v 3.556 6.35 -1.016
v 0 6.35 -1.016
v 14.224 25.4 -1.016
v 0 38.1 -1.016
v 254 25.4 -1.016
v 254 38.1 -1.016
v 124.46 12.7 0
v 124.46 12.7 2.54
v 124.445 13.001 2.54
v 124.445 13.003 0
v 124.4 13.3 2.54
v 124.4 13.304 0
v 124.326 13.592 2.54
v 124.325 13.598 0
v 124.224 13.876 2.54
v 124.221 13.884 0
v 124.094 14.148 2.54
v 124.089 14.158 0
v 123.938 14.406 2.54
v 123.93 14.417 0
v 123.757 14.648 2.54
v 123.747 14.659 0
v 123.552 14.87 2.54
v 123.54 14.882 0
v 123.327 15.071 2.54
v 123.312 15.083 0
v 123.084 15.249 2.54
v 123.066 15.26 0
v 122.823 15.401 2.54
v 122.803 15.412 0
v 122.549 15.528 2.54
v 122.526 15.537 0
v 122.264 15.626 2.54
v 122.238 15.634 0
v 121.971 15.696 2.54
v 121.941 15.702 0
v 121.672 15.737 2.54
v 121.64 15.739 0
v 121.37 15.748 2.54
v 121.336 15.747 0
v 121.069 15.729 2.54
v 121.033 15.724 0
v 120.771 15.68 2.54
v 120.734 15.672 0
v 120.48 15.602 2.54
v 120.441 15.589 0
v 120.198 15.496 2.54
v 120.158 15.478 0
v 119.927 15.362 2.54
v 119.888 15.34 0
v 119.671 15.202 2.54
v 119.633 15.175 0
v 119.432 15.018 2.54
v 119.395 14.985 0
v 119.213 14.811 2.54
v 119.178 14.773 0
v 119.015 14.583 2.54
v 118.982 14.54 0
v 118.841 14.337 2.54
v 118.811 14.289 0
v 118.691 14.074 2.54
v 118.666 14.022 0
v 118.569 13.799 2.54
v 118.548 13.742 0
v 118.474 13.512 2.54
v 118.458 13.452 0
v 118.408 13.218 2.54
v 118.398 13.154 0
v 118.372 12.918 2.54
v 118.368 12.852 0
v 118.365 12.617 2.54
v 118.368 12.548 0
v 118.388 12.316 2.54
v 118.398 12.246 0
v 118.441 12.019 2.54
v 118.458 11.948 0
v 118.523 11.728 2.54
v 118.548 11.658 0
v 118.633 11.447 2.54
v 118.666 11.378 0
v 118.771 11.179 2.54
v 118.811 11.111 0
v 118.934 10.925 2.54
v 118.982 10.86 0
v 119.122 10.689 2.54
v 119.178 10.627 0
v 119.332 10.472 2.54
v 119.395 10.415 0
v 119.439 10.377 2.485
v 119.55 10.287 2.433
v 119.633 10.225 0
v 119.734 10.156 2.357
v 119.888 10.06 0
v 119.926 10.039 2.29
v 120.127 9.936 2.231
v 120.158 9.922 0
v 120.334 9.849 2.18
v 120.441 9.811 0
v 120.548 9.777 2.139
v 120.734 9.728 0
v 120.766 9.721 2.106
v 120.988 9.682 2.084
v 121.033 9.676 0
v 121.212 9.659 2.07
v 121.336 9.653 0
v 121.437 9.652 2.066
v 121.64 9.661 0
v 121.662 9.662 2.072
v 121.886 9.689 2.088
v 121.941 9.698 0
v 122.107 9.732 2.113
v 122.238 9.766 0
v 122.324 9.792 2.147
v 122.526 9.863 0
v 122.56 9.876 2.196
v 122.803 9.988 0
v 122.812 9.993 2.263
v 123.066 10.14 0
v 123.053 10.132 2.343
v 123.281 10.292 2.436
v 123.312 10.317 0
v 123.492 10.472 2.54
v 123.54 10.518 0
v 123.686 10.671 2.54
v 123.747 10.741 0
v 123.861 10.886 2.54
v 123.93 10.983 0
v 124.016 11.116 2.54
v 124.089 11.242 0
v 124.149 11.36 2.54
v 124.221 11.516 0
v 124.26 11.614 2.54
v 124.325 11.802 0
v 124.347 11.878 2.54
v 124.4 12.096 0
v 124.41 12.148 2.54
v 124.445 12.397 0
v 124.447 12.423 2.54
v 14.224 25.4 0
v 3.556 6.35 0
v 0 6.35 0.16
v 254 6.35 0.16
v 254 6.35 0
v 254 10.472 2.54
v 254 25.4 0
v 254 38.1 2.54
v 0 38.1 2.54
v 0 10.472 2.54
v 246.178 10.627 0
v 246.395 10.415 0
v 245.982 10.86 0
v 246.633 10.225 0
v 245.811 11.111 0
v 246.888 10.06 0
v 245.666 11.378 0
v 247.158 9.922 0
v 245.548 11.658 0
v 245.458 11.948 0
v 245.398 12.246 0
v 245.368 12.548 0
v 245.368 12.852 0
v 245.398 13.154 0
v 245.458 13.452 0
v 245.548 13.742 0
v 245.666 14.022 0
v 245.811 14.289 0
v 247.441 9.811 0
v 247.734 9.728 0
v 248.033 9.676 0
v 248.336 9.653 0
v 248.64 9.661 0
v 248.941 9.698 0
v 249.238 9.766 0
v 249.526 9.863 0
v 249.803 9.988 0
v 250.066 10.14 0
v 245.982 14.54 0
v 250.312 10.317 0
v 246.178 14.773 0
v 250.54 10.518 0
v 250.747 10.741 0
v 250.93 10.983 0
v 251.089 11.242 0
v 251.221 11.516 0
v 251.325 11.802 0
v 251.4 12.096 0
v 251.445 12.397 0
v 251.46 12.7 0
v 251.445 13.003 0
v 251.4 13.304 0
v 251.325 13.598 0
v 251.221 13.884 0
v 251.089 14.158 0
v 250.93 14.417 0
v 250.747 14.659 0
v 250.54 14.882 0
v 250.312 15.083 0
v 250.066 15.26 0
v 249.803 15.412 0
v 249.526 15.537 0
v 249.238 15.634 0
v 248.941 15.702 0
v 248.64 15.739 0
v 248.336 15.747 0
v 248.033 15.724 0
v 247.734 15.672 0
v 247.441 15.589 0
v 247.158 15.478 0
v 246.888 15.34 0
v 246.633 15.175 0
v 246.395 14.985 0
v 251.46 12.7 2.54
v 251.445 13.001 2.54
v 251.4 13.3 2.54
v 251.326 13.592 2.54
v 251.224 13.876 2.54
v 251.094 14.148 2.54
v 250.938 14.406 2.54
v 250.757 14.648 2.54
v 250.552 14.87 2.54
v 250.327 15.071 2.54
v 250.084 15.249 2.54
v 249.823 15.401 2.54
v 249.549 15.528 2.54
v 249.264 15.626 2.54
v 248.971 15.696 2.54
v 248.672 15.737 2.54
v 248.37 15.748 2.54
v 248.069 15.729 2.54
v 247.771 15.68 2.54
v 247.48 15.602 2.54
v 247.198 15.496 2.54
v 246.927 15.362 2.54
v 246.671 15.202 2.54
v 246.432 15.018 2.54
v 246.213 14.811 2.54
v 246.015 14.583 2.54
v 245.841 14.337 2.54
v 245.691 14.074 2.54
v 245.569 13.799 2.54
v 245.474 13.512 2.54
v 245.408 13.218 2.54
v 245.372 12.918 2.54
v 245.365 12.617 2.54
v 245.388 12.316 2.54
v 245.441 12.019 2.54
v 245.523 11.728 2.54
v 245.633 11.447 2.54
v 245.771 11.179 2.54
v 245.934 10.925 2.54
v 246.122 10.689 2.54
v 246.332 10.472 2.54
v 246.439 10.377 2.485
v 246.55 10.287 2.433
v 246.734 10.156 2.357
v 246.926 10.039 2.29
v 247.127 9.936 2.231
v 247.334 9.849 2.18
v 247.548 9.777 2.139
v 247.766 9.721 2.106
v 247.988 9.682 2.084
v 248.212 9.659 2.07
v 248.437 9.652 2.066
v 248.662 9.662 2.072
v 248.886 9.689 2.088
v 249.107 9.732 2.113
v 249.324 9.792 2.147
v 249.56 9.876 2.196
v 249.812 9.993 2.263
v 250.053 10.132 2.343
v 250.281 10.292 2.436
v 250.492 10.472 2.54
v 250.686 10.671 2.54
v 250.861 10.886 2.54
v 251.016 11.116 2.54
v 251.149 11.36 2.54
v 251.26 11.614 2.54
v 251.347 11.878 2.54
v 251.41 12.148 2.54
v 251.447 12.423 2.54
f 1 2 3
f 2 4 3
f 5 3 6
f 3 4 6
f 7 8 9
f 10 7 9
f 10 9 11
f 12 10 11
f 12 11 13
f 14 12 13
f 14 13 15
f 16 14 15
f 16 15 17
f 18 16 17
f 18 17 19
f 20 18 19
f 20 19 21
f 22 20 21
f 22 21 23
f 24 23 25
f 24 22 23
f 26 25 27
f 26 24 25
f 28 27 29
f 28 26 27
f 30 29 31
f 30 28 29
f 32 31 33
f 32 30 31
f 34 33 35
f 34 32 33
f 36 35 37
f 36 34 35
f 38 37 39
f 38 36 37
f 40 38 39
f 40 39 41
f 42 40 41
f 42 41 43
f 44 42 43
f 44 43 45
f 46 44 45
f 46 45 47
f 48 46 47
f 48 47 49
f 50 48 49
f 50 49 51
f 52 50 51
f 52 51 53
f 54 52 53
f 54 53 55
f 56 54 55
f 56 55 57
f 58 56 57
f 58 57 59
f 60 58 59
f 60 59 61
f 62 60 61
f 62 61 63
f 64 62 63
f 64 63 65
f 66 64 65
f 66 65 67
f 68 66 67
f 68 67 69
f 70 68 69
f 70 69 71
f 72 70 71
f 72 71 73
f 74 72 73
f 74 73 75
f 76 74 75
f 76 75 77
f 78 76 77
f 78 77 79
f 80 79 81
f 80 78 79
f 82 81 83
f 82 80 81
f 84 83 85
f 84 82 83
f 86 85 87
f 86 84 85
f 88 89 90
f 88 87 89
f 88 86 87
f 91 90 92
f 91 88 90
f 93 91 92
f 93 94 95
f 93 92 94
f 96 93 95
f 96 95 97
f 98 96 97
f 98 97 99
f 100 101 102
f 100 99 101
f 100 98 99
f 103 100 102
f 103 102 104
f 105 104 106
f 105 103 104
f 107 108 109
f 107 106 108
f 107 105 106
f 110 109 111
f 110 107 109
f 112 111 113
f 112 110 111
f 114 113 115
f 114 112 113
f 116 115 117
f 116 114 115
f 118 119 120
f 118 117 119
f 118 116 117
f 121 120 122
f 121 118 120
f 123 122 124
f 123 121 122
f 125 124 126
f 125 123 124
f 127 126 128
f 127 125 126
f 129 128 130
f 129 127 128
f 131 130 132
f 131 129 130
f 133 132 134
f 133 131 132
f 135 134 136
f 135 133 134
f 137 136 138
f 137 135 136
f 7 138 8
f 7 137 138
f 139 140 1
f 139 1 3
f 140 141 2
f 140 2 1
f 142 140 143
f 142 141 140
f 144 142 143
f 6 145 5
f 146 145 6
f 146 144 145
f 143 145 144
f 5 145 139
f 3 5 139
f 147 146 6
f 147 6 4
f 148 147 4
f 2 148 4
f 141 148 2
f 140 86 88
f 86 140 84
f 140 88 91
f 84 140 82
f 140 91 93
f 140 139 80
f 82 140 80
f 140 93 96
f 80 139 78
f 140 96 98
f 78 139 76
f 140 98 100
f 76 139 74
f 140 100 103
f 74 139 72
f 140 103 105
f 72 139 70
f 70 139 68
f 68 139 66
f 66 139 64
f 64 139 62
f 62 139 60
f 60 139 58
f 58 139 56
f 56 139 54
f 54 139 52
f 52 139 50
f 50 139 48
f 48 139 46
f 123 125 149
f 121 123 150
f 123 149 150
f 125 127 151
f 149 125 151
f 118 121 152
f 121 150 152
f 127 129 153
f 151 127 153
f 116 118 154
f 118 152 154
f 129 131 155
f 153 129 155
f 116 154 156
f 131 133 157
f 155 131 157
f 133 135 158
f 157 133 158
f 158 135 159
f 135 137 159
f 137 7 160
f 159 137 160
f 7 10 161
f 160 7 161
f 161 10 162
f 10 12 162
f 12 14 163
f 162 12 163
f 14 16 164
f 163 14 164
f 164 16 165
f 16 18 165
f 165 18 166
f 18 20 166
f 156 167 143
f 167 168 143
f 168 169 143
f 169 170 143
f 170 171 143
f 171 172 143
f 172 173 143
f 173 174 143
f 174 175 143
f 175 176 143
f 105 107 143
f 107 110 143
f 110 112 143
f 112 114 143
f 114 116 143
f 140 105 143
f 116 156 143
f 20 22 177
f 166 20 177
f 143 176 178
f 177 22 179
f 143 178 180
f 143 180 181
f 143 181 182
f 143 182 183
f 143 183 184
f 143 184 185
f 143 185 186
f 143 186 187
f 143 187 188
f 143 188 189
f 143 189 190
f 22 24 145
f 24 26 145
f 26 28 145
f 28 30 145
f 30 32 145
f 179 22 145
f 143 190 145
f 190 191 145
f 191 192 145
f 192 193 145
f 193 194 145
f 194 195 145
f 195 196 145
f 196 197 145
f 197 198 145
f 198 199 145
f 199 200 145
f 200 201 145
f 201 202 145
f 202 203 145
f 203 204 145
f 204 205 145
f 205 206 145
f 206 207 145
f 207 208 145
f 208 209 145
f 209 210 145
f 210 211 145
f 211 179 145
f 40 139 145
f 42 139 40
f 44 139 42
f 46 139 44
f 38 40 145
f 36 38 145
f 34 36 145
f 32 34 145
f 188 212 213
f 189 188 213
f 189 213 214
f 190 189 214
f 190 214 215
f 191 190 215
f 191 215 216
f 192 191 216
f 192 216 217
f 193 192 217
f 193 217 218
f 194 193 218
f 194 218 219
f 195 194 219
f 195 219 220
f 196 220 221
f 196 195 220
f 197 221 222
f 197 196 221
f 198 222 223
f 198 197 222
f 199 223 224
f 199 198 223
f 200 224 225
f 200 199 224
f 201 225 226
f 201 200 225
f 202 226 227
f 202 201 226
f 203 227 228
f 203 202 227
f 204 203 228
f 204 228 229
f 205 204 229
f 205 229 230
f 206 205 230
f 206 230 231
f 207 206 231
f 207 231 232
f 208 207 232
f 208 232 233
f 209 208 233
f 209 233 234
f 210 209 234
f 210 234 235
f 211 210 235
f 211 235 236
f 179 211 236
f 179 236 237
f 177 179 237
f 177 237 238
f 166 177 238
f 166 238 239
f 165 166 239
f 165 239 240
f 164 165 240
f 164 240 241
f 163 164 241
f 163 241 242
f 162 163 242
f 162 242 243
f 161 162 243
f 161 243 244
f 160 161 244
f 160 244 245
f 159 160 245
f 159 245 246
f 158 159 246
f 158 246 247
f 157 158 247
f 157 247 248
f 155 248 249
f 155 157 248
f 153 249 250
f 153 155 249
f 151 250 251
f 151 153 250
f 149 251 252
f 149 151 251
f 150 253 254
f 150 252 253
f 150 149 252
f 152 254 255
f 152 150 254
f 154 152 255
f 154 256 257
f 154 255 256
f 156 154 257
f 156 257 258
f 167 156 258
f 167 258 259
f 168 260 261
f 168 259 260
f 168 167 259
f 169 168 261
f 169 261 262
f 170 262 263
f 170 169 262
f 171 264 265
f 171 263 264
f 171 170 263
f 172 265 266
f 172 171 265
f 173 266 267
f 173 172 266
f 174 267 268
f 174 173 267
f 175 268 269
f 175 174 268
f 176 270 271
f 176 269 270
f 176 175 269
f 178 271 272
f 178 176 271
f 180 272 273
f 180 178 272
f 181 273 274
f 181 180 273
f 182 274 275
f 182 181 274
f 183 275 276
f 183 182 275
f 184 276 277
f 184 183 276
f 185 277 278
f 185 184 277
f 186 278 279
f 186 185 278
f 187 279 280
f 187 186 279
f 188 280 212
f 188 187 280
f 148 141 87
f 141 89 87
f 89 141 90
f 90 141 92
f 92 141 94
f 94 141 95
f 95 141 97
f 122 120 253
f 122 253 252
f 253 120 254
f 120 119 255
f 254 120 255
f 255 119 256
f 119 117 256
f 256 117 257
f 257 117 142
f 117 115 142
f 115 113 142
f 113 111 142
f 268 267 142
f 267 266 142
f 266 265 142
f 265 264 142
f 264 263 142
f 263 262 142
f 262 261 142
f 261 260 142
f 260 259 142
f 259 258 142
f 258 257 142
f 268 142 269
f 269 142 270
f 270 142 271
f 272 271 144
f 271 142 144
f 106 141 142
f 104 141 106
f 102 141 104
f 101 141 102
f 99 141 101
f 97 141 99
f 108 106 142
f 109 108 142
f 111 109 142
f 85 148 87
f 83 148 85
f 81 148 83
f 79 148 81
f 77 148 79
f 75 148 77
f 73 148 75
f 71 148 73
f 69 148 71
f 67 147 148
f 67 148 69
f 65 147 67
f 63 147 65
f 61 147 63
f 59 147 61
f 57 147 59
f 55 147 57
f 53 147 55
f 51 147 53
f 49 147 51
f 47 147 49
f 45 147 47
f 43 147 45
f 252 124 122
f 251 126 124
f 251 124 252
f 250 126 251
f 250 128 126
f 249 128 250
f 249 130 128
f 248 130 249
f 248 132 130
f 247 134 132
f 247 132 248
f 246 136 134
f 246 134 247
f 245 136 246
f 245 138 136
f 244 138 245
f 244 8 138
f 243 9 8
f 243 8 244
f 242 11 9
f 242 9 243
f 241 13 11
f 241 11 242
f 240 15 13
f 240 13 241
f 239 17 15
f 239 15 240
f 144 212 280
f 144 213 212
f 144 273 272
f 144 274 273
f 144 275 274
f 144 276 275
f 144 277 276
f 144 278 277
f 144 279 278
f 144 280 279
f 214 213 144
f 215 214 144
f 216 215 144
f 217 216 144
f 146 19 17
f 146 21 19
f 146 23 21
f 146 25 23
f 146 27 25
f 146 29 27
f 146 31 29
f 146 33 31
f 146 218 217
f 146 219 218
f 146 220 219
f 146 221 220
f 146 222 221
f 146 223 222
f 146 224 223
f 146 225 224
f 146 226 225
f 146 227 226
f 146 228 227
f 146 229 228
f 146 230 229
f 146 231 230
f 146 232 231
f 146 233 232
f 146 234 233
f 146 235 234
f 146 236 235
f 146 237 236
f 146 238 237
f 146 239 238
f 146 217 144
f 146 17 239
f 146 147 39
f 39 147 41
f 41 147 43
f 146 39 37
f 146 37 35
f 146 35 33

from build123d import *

# Parameters (mm, degrees)
SKETCH1_W           = 254
SKETCH1_H           = 31.75
SKETCH1_R           = 3.048
BOSS_EXTRUDE1_DEPTH = 2.54
CHAMFER1_SIZE       = 2.38
CHAMFER1_SIZE_2     = 4.122280922
SKETCH3_W           = 254
SKETCH3_H           = 12.7
BOSS_EXTRUDE2_DEPTH = 1.016
BOSS_EXTRUDE3_DEPTH = 1.016


with BuildPart() as part:
    # Sketch1 → Boss-Extrude1 (new body)
    with BuildSketch(Plane.XY):
        with Locations((127, 22.225)):
            Rectangle(SKETCH1_W, SKETCH1_H)
        with Locations((121.412, 12.7)):
            Circle(SKETCH1_R, mode=Mode.SUBTRACT)
        with Locations((248.412, 12.7)):
            Circle(SKETCH1_R, mode=Mode.SUBTRACT)
    extrude(amount=BOSS_EXTRUDE1_DEPTH)

    # Chamfer1
    # the kernel refuses this chamfer: 4.122280922, 2.38 mm, written as the material it takes off along each edge
    with BuildSketch(Plane(origin=(264.66469425, 6.35, 2.54), x_dir=(0, -0.05789386240267149, -0.9983227437537926), z_dir=(-1, 0, 0))) as chamfer1_piece_1:
        Polygon((CHAMFER1_SIZE * 0.998322743754, -CHAMFER1_SIZE * 0.0578938624027), (-CHAMFER1_SIZE_2 * 0.0578938624029, -CHAMFER1_SIZE_2 * 0.998322743757), (0, 0), align=None)
    extrude(amount=275.3293885, mode=Mode.SUBTRACT)

    # Sketch3 → Boss-Extrude2 (add)
    with BuildSketch(Plane(origin=(0, 0, 0), x_dir=(-1, 0, 0), z_dir=(0, 0, -1))):
        with Locations((-127, 31.75)):
            Rectangle(SKETCH3_W, SKETCH3_H)
    extrude(amount=BOSS_EXTRUDE2_DEPTH)

    # Sketch4 → Boss-Extrude3 (add)
    with BuildSketch(Plane(origin=(0, 0, 0), x_dir=(-1, 0, 0), z_dir=(0, 0, -1))):
        Polygon((0, 25.4), (0, 6.35), (-3.556, 6.35), (-14.224, 25.4), align=None)
    extrude(amount=BOSS_EXTRUDE3_DEPTH)


solid = part.part
